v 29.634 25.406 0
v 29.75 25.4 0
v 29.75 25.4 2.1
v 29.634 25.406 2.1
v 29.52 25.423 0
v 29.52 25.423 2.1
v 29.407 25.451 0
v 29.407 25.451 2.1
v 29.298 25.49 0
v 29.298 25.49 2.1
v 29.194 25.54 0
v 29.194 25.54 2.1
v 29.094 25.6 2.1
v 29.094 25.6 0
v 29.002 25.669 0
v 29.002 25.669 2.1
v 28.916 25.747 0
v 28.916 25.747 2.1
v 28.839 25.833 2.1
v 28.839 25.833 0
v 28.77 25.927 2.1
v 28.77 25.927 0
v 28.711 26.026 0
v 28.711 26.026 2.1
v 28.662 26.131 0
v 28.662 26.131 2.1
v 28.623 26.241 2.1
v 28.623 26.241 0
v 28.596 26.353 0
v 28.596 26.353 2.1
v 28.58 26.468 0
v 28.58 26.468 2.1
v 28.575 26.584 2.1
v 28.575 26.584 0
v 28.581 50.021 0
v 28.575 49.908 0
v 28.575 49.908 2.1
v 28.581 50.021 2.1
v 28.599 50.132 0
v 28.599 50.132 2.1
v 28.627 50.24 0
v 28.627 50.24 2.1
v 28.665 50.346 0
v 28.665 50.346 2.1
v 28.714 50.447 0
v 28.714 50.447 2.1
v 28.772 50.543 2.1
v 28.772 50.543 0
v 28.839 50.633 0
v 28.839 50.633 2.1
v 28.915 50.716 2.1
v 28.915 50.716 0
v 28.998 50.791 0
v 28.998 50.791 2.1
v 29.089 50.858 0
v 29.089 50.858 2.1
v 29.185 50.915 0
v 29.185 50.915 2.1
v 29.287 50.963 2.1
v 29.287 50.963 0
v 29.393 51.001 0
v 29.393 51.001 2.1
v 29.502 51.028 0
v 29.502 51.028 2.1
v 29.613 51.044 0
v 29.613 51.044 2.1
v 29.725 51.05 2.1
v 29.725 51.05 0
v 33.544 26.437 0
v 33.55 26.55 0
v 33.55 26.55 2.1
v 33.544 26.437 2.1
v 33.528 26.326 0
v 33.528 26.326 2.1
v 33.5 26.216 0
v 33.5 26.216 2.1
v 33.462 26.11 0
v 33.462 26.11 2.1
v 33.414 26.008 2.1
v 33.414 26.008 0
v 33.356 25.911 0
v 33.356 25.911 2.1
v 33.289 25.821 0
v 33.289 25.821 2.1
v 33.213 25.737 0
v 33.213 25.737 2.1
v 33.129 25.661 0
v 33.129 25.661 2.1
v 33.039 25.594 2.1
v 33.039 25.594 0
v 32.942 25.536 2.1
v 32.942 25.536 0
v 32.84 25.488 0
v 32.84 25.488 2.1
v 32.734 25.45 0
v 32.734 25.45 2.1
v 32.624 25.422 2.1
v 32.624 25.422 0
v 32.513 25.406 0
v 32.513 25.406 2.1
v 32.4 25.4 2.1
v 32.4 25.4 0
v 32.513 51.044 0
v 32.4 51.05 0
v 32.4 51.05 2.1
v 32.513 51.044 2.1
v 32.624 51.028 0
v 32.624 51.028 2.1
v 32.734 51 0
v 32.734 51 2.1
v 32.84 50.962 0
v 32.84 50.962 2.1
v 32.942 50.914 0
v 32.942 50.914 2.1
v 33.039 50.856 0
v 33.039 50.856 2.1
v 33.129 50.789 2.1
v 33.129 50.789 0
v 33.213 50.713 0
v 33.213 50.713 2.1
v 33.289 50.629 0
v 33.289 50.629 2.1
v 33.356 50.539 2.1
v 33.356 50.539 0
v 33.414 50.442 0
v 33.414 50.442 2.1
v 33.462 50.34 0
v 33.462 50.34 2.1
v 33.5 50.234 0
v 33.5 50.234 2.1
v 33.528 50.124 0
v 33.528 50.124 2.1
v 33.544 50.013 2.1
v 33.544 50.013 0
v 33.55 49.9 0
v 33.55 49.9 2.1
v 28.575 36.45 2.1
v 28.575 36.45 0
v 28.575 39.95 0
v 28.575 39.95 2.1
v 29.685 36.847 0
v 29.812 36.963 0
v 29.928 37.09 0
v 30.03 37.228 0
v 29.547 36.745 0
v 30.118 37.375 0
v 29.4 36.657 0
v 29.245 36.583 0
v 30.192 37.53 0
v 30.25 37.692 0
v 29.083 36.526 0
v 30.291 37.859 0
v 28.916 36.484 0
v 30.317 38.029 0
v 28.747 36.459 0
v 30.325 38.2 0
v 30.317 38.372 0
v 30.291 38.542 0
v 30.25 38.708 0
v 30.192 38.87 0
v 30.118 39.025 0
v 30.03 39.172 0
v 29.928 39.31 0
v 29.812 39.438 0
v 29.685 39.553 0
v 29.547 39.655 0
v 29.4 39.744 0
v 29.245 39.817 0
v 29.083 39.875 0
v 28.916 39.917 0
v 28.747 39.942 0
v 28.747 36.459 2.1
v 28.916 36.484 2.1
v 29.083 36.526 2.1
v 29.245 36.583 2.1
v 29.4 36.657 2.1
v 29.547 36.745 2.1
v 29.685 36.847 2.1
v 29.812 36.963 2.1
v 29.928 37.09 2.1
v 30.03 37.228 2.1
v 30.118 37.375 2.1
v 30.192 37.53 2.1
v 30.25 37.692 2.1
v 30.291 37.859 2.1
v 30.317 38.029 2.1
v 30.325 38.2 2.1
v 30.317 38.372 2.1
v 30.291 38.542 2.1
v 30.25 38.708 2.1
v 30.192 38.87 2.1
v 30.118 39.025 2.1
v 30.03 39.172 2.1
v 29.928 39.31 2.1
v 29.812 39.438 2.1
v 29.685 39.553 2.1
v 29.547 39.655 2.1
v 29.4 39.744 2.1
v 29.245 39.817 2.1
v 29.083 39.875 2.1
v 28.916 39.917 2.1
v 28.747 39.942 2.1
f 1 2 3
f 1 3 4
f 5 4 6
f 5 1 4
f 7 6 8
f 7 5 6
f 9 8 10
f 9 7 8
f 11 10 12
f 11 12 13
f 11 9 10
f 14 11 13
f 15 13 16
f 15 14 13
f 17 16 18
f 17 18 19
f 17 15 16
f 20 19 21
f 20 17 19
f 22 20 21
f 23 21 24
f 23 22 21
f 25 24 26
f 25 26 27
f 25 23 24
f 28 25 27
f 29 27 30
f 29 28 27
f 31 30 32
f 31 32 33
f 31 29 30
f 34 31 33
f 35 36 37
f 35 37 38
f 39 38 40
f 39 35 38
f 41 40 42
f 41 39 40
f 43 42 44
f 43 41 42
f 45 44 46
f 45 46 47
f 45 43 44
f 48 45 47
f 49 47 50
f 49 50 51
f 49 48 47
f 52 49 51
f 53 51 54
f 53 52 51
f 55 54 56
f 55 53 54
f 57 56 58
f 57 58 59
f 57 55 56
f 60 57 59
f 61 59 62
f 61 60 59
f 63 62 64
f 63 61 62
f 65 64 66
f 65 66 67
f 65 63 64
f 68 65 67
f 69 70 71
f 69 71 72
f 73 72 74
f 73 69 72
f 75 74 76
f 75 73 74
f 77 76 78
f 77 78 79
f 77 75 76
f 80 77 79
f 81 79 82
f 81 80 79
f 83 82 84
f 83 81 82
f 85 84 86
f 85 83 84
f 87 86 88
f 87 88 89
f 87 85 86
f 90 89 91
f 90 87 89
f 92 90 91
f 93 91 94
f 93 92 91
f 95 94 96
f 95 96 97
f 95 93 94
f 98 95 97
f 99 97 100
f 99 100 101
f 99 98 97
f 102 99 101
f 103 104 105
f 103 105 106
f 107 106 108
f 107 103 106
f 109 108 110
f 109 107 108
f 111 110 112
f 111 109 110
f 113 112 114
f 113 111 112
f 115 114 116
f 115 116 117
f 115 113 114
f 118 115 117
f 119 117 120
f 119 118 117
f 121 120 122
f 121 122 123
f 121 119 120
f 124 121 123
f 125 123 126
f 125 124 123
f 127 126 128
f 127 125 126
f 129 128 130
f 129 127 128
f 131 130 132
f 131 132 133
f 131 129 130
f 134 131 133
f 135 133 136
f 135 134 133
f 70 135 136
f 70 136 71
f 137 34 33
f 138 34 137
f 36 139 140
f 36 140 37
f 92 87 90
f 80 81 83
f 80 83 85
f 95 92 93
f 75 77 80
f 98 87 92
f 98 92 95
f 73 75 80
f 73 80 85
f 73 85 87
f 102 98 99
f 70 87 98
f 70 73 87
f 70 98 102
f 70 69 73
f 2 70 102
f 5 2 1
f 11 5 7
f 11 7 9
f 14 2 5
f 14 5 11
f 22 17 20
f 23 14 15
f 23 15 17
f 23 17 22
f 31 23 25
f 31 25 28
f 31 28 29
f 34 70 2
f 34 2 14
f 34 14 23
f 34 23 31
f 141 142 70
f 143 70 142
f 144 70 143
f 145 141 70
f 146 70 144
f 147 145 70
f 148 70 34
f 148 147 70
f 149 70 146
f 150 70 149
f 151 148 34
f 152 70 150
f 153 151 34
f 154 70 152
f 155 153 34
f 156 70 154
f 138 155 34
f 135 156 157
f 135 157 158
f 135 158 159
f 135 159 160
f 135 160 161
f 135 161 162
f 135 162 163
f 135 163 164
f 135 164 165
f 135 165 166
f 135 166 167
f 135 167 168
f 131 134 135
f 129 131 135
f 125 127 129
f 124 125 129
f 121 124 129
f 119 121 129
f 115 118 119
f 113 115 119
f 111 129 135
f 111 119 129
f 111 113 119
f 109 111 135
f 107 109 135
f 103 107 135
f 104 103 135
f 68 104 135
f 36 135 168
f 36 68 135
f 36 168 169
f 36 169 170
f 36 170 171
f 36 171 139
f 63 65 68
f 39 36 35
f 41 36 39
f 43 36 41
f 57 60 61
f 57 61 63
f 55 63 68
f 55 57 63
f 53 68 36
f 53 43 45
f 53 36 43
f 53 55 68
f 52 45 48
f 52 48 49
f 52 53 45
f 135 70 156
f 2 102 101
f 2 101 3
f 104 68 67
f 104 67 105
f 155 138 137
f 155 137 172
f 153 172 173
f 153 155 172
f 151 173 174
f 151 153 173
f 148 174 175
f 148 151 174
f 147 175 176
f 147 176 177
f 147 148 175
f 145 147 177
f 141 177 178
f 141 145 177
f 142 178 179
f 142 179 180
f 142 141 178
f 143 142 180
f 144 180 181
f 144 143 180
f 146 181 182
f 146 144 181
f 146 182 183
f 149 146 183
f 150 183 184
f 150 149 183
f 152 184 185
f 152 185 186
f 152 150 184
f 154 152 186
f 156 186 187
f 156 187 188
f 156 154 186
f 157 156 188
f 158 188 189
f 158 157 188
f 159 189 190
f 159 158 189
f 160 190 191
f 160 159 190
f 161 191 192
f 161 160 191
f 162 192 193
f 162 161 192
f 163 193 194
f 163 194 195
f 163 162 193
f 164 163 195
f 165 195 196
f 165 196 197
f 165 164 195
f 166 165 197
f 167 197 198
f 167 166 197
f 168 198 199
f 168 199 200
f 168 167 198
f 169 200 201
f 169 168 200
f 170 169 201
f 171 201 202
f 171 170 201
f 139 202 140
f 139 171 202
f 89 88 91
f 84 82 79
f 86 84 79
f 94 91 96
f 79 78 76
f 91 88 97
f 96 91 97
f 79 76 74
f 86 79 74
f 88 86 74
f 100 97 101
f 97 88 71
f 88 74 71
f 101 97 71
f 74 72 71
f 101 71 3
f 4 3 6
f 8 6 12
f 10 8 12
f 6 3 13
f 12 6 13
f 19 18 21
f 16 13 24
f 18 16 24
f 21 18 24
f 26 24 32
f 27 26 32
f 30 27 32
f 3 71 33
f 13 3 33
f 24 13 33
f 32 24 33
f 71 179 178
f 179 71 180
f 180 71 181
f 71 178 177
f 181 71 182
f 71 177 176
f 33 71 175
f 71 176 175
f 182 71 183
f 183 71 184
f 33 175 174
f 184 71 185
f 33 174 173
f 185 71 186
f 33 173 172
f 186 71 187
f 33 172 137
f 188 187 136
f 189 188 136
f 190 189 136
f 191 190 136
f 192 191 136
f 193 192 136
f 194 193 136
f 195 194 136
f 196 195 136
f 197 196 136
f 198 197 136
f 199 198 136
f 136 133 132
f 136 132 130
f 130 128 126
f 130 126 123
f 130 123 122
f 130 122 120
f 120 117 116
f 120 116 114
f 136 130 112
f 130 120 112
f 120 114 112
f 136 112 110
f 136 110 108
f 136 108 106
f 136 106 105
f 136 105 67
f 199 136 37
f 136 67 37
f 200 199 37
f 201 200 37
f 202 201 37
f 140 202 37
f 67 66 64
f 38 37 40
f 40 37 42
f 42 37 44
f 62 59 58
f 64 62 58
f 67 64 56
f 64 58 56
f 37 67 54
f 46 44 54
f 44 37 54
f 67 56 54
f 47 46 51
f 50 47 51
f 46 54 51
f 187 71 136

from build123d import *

# Parameters (mm, degrees)
EXTRUDE_1_DEPTH = 2.1


with BuildPart() as part:
    # Эскиз1 → Бобышка-Вытянуть1 (new body)
    with BuildSketch(Plane(origin=(0, 0, 0), x_dir=(-1, 0, 0), z_dir=(0, 0, -1))):
        with BuildLine():
            Line((-32.400001526, 25.399999619), (-29.75, 25.399999619))
            ThreePointArc((-29.75, 25.399999619), (-28.915971608, 25.747039587), (-28.575035851, 26.583581821))
            Line((-28.575035851, 26.583581821), (-28.575035851, 36.450190384))
            ThreePointArc((-28.575035851, 36.450190384), (-30.325030381, 38.200184914), (-28.575035851, 39.950179444))
            Line((-28.575035851, 39.950179444), (-28.575035851, 49.908417469))
            ThreePointArc((-28.575035851, 49.908417469), (-28.914981331, 50.715971039), (-29.725000381, 51.049999237))
            Line((-29.725000381, 51.049999237), (-32.400001526, 51.049999237))
            ThreePointArc((-32.400001526, 51.049999237), (-33.213001251, 50.713001251), (-33.549999237, 49.900001526))
            Line((-33.549999237, 49.900001526), (-33.549999237, 26.549999237))
            ThreePointArc((-33.549999237, 26.549999237), (-33.213000972, 25.736999232), (-32.400001526, 25.399999619))
        make_face()
    extrude(amount=-EXTRUDE_1_DEPTH)


solid = part.part
